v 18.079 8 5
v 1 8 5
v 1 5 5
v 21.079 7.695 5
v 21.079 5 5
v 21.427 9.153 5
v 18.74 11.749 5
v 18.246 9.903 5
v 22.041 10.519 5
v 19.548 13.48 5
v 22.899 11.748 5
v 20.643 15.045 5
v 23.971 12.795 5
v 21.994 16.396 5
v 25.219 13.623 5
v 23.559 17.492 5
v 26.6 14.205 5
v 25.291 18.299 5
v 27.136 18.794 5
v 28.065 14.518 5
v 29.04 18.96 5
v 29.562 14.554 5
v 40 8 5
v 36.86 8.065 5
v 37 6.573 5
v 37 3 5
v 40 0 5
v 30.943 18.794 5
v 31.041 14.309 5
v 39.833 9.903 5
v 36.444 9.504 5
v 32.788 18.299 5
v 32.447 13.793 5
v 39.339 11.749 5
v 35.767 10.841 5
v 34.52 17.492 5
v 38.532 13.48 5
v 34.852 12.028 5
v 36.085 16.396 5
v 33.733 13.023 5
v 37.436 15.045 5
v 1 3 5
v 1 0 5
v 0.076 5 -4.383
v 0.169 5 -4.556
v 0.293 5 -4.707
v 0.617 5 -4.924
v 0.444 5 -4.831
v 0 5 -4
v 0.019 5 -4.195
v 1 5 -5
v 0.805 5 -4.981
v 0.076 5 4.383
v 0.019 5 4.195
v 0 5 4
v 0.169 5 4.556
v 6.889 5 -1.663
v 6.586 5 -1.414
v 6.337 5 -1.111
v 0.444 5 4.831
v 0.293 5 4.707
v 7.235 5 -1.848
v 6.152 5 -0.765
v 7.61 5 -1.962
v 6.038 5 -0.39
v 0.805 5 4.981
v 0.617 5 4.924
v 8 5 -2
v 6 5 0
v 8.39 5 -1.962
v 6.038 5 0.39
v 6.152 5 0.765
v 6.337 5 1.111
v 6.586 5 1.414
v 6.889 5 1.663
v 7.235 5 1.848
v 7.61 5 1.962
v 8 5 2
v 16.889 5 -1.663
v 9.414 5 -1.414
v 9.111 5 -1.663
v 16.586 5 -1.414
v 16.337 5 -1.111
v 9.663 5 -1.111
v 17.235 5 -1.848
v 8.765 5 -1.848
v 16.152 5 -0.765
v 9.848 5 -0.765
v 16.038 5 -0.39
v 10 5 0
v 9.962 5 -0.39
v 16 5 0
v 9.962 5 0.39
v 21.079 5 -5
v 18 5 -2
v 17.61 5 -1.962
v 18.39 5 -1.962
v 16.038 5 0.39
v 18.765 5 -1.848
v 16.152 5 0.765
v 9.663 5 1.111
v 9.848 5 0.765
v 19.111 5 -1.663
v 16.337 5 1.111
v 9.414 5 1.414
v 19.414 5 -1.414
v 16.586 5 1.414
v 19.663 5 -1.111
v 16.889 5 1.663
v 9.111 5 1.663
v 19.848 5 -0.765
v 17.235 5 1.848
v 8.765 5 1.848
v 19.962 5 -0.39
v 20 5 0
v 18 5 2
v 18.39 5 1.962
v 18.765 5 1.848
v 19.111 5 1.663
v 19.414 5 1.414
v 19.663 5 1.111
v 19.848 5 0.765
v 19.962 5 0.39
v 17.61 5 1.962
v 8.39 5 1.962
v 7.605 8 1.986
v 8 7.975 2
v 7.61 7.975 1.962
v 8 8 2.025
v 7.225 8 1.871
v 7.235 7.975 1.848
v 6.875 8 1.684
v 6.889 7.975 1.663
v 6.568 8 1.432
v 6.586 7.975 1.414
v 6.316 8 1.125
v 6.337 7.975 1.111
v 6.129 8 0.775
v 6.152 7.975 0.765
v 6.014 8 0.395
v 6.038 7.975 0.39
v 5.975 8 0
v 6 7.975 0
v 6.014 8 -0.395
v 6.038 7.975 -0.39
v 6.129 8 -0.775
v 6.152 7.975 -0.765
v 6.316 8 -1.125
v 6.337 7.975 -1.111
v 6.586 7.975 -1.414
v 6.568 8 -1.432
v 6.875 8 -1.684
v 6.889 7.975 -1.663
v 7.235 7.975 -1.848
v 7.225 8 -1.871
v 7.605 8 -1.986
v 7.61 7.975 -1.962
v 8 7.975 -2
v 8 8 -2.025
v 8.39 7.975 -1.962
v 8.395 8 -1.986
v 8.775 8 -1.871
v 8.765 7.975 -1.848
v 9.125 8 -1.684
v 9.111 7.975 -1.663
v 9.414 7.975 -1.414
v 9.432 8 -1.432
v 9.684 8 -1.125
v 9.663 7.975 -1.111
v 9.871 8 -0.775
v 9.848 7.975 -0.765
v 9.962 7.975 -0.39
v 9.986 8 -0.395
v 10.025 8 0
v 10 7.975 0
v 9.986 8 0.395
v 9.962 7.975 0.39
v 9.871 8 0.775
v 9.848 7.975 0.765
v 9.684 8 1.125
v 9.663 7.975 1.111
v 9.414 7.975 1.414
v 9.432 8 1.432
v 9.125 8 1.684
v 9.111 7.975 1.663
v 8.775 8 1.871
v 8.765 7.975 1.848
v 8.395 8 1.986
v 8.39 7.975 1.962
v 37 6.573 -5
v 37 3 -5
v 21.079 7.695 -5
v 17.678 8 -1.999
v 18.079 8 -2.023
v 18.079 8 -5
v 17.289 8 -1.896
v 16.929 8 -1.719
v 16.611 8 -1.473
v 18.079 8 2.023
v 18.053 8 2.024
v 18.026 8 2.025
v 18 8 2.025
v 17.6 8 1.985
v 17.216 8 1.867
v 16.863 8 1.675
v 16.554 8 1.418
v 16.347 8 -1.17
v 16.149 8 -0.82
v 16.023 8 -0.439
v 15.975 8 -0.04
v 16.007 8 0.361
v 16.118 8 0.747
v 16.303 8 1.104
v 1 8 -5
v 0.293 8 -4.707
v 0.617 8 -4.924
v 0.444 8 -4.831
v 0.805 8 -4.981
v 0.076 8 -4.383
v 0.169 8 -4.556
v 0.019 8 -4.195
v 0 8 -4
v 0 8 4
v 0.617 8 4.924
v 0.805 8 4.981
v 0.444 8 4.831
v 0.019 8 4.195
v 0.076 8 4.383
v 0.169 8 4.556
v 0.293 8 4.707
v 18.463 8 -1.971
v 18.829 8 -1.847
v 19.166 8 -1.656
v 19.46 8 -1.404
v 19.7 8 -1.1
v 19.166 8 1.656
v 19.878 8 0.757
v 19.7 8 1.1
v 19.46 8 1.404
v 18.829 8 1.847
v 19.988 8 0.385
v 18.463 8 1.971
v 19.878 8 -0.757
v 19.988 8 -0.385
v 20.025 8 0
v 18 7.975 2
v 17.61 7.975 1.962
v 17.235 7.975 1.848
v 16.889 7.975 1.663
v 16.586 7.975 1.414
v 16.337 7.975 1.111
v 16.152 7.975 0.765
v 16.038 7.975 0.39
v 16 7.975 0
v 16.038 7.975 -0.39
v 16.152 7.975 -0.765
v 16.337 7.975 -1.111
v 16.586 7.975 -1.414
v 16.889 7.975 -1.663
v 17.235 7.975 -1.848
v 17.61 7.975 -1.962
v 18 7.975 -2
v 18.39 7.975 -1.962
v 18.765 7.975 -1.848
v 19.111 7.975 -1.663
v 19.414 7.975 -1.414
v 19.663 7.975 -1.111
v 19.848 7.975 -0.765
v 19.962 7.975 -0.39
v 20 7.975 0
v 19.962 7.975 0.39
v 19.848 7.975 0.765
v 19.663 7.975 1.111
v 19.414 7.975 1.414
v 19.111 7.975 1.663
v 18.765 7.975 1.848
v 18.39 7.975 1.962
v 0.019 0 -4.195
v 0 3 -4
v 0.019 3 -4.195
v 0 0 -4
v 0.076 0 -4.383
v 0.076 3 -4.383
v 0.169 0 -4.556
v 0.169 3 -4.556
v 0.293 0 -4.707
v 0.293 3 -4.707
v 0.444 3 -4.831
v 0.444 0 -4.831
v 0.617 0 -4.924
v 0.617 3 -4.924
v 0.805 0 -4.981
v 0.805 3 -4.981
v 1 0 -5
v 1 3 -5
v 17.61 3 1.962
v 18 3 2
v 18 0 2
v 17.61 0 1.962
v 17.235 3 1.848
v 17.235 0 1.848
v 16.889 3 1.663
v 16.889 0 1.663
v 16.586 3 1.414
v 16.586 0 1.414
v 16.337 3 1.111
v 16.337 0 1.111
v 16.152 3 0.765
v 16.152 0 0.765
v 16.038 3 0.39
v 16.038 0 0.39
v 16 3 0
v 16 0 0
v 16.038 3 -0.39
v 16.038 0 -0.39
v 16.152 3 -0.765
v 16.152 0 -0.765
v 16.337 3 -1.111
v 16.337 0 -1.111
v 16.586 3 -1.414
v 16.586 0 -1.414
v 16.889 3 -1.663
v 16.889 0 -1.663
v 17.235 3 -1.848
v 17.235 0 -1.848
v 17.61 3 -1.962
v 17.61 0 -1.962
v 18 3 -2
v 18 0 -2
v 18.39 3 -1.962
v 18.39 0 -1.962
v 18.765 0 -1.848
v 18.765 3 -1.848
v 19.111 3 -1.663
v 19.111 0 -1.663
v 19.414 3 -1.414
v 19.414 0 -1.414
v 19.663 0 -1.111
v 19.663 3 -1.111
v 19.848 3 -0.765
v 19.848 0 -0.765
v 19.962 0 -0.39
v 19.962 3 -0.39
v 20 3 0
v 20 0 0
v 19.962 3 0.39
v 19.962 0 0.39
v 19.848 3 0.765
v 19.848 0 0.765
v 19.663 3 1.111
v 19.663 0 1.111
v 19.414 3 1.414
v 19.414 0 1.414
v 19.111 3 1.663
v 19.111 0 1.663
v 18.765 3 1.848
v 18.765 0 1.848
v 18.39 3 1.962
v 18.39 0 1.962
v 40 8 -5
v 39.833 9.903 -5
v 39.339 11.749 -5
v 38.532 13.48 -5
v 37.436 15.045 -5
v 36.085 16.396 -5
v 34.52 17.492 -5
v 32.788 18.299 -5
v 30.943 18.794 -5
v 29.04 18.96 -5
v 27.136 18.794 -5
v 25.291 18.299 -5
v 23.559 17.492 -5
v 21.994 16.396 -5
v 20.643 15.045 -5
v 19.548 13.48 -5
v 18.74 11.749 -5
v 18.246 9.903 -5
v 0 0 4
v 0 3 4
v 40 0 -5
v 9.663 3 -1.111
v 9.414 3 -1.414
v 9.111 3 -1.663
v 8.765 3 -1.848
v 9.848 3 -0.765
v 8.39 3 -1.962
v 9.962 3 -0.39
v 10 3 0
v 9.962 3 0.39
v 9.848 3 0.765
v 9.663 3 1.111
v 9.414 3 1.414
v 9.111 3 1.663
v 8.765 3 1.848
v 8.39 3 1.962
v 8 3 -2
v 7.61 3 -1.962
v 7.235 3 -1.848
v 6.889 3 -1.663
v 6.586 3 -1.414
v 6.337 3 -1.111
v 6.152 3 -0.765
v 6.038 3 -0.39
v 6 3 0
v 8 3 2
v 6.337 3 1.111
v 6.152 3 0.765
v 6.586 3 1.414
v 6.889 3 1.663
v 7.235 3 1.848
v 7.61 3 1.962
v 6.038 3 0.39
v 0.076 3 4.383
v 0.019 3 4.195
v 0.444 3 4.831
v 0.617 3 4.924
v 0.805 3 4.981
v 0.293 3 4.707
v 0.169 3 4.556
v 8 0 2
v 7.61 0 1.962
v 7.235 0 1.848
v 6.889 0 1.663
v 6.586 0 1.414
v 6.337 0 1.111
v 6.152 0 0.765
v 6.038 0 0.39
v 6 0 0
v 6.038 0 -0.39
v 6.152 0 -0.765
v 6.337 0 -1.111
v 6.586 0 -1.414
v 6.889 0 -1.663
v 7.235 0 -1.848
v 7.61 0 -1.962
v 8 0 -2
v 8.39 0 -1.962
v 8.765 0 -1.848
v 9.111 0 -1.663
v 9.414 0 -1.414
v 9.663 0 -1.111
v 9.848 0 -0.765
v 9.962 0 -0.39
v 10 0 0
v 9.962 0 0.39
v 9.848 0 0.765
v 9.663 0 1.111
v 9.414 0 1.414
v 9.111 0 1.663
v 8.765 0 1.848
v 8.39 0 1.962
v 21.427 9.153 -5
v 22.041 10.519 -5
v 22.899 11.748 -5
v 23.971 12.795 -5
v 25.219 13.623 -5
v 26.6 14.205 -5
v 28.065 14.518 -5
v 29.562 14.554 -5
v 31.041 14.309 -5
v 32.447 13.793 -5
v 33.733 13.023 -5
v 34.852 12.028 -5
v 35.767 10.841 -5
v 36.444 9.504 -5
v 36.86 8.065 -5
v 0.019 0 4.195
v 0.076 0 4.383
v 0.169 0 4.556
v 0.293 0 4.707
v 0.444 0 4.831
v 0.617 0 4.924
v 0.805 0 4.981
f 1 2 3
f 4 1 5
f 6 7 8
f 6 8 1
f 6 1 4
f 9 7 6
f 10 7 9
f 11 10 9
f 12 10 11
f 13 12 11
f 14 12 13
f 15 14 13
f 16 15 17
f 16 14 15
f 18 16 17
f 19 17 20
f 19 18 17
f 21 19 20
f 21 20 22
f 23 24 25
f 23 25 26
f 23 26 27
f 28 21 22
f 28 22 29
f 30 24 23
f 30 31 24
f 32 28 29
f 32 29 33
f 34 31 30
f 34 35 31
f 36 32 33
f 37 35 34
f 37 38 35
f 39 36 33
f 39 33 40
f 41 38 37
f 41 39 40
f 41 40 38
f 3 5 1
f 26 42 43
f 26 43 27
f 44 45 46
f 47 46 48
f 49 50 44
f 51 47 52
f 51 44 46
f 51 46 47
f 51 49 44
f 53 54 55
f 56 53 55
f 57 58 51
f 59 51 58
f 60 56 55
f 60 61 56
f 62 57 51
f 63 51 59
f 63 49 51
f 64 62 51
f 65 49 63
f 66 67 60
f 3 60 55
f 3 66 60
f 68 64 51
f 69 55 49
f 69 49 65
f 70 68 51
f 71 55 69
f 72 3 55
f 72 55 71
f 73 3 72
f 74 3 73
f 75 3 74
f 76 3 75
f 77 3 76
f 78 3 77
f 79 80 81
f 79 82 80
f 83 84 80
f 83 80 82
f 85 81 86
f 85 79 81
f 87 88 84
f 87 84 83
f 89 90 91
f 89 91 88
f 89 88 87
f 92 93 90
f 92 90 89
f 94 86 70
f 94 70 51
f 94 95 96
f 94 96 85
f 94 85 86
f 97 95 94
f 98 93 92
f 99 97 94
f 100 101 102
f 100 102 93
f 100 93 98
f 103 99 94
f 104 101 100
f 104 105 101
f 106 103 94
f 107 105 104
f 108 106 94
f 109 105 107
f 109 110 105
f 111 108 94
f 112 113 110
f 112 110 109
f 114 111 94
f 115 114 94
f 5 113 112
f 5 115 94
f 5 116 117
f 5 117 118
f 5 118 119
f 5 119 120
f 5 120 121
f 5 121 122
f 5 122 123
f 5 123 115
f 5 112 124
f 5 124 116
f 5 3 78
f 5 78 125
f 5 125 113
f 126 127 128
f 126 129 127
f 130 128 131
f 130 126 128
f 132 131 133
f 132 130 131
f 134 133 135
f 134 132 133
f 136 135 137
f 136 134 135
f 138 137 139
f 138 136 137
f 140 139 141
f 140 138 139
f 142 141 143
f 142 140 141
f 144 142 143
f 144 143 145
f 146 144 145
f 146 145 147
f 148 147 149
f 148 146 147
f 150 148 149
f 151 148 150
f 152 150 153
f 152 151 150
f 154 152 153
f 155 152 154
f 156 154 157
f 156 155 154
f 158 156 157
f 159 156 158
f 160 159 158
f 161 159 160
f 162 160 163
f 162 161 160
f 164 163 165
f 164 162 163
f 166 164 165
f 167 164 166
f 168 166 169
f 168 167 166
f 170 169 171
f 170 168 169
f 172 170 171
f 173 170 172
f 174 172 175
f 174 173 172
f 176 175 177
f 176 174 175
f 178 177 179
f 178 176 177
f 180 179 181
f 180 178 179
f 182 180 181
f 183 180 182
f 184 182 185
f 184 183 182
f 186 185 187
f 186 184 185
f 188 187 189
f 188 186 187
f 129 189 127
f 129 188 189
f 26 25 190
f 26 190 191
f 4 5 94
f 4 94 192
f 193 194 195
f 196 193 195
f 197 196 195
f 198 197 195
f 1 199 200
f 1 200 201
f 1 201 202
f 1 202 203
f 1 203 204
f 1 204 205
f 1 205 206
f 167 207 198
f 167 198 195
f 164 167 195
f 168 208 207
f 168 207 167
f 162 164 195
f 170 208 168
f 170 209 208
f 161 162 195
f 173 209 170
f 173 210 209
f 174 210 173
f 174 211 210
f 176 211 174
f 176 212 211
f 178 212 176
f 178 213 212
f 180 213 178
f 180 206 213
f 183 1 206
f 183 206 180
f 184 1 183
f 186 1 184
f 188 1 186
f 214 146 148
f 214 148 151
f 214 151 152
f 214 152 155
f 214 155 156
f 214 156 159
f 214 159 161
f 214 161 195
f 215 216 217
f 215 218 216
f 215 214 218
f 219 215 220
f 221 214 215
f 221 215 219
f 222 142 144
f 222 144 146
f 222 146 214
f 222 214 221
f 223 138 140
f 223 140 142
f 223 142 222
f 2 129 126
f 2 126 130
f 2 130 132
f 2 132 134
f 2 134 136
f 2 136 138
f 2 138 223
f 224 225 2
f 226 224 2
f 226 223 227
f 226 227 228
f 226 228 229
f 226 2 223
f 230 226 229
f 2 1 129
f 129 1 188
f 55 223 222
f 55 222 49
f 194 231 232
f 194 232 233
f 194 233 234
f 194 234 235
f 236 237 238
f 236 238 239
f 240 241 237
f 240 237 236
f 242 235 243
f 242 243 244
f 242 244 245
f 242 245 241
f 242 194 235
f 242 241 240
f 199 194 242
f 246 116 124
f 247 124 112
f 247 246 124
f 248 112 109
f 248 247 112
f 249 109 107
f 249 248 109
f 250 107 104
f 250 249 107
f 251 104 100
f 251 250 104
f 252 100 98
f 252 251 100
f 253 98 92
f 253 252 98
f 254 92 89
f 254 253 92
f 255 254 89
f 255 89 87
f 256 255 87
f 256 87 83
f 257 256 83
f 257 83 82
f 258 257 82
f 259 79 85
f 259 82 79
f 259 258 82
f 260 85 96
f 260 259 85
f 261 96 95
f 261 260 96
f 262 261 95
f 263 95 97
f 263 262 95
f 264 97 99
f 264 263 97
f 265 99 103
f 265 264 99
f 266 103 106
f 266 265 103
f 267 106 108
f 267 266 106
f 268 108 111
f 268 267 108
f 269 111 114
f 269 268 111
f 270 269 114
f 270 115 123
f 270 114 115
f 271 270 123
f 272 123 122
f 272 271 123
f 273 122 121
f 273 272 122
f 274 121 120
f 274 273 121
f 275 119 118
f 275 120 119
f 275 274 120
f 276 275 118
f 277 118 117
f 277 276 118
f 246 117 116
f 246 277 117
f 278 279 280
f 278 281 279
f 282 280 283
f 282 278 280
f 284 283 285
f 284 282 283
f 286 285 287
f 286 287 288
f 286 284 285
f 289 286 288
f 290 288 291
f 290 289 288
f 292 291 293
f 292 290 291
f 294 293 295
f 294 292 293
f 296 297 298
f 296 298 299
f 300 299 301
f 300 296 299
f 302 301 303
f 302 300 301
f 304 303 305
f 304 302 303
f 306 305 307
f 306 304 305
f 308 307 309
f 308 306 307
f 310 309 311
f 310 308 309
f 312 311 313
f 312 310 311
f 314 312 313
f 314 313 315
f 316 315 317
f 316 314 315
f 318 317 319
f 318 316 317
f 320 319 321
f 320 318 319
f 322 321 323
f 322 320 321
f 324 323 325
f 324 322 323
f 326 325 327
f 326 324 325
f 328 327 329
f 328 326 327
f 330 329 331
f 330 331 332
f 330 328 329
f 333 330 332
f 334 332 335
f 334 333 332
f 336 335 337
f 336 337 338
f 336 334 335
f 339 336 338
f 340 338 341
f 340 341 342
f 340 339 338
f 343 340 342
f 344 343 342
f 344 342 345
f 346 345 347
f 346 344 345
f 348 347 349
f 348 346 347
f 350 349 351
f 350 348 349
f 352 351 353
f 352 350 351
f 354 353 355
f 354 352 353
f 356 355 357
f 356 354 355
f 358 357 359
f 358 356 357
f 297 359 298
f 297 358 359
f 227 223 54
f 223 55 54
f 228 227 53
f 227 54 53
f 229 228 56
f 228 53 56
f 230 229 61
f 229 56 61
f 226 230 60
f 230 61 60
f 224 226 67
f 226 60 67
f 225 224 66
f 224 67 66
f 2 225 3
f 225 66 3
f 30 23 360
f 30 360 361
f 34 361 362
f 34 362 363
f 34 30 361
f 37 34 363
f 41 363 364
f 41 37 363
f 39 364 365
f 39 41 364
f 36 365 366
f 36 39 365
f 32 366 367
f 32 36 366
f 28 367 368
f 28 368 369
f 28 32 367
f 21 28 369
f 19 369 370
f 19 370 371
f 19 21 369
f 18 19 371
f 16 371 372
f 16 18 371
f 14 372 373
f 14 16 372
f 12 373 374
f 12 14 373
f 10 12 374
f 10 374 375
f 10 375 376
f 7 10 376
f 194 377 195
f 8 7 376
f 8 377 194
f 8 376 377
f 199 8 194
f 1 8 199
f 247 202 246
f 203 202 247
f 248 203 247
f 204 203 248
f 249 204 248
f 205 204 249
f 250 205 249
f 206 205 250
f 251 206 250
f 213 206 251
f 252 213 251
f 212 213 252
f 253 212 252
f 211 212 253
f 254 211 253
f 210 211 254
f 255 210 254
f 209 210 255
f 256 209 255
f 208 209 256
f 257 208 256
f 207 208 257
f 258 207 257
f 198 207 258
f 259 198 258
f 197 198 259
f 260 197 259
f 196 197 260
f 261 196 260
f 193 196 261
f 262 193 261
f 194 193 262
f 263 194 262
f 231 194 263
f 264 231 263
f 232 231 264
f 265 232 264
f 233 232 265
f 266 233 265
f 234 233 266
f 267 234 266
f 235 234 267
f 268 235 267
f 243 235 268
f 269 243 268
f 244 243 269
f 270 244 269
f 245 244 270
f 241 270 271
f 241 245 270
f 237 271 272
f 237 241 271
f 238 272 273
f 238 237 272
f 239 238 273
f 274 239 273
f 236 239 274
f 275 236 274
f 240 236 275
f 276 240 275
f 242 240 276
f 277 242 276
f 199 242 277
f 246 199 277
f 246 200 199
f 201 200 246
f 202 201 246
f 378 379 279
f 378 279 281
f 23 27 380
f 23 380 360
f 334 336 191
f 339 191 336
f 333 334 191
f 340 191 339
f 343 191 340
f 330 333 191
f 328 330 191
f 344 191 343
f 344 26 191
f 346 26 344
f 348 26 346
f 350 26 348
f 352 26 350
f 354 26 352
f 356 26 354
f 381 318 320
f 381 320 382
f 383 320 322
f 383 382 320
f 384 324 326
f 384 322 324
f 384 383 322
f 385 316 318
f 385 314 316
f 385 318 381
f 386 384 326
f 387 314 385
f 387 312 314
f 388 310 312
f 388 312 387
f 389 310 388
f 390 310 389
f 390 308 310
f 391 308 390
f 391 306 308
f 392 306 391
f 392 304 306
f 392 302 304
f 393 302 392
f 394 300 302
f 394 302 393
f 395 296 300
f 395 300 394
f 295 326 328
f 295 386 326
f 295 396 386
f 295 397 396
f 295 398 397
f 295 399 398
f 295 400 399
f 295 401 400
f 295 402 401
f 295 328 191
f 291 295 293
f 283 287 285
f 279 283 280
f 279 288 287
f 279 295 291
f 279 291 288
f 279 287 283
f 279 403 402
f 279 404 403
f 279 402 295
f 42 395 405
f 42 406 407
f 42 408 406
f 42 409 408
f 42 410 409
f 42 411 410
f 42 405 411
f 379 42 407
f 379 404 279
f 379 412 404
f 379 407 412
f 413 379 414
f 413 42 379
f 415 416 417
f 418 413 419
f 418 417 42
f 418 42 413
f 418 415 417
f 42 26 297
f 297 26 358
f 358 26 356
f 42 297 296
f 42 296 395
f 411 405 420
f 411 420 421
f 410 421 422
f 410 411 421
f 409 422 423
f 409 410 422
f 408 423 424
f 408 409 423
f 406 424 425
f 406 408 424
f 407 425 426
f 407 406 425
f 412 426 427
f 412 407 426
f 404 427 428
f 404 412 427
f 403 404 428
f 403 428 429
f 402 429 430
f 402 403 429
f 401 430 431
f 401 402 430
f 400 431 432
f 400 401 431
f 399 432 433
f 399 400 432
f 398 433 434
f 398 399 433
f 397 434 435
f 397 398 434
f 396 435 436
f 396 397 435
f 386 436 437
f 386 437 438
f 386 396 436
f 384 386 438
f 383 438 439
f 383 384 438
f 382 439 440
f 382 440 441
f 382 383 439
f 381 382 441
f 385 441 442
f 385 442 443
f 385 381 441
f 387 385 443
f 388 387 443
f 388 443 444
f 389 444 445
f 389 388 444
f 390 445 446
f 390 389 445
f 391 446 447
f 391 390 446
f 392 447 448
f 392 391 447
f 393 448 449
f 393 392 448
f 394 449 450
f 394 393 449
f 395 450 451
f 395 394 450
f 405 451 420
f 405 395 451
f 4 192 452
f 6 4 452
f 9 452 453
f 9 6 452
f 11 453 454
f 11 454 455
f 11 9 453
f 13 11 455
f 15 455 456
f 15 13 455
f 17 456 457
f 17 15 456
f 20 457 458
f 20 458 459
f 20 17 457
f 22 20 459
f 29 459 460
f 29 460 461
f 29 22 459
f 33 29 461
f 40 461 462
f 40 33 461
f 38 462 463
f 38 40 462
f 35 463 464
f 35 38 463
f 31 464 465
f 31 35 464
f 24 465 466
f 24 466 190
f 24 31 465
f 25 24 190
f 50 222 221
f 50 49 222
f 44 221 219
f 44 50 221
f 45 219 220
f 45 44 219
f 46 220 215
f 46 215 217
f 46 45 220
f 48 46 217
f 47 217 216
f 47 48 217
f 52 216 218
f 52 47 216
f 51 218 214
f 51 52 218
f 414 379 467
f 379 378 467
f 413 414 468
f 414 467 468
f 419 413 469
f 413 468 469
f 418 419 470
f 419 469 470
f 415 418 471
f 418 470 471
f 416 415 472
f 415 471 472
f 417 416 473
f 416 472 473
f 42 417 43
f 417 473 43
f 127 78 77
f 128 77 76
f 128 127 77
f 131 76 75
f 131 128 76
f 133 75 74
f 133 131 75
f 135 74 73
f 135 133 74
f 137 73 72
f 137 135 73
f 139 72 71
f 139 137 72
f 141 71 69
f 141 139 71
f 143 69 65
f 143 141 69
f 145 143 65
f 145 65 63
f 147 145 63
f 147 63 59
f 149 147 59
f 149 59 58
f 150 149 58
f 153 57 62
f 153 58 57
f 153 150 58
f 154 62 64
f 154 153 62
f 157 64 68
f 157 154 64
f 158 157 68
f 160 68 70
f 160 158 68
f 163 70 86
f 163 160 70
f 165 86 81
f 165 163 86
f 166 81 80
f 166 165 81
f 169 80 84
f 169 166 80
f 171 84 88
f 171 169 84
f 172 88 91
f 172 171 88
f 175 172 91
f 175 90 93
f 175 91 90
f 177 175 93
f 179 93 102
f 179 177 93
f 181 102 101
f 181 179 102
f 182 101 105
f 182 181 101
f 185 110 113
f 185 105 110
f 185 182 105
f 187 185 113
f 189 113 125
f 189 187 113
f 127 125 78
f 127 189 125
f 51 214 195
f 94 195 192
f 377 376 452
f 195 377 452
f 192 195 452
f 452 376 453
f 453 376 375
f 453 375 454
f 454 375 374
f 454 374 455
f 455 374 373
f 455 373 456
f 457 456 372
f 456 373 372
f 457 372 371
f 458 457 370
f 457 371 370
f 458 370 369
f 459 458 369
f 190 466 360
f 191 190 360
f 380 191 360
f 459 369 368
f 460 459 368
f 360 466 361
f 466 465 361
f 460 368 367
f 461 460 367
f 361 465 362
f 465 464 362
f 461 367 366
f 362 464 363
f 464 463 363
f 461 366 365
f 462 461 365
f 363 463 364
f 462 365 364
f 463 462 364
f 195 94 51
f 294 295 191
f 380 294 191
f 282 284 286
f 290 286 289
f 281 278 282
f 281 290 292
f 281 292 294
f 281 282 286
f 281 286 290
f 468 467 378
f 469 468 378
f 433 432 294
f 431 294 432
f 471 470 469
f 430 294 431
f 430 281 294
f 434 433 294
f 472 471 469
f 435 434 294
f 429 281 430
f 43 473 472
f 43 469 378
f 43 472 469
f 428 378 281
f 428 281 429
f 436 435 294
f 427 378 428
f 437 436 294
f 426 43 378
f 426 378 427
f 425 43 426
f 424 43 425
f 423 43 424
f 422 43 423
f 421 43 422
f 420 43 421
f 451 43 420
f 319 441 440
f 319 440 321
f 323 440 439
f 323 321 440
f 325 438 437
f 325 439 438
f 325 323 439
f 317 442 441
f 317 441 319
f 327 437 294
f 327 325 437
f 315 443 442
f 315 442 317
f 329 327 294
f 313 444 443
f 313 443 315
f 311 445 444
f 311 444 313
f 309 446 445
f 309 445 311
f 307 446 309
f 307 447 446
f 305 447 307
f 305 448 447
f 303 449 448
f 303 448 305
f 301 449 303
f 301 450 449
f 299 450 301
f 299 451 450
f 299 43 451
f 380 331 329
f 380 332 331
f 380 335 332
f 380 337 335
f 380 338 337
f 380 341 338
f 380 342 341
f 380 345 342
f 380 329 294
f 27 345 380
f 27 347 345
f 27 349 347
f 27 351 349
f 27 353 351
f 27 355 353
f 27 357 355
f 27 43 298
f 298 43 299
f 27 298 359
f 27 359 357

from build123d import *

# Parameters (mm, degrees)
BOSS_EXTRUDE1_DEPTH            = 5
BOSS_EXTRUDE1_DEPTH_BACK       = 5
FILLET1_R                      = 1
F_4_0MM_DOWEL_HOLE1_AT_2_COUNT = 2
F_4_0MM_DOWEL_HOLE1_AT_2_PITCH = 10


with BuildPart() as part:
    # Sketch1 → Boss-Extrude1 (new, two sides: drawn at the far end of the back side and taken through both)
    with BuildSketch(Plane.XY.offset(-BOSS_EXTRUDE1_DEPTH_BACK)):
        with BuildLine():
            Line((0, 0), (40, 0))
            Line((40, 0), (40, 8))
            ThreePointArc((40, 8), (29.039542787, 18.960457213), (18.079085573, 8))
            Line((18.079085573, 8), (0, 8))
            Line((0, 8), (0, 5))
            Line((0, 5), (21.079085573, 5))
            Line((21.079085573, 5), (21.079085573, 7.695472827))
            ThreePointArc((21.079085573, 7.695472827), (29.562443146, 14.553574165), (37, 6.57337005))
            Line((37, 6.57337005), (37, 3))
            Line((37, 3), (0, 3))
            Line((0, 3), (0, 0))
        make_face()
    extrude(amount=BOSS_EXTRUDE1_DEPTH + BOSS_EXTRUDE1_DEPTH_BACK)

    # Fillet1
    fillet1_edges = [part.edges().sort_by_distance(p)[0] for p in [
        (0, 1.5, 5),
        (0, 6.5, 5),
        (0, 1.5, -5),
        (0, 6.5, -5),
    ]]
    fillet(fillet1_edges, radius=FILLET1_R)

    # Sketch5 → Ø4.0mm Dowel Hole1 (revolve, cut)
    with BuildSketch(Plane(origin=(8, 8, 0), x_dir=(0, 0, 1), z_dir=(1, 0, 0))):
        Polygon((0, 0), (0, 8), (2, 8), (2, 0.025), (2.025, 0), align=None)
    f_4_0mm_dowel_hole1 = revolve(axis=Axis((8, 14.35, 0), (0, -1, 0)), mode=Mode.SUBTRACT)

    # Ø4.0mm Dowel Hole1 at 2: Ø4.0mm Dowel Hole1 ×2
    with Locations(*[(i * F_4_0MM_DOWEL_HOLE1_AT_2_PITCH, 0, 0) for i in range(1, F_4_0MM_DOWEL_HOLE1_AT_2_COUNT)]):
        add(f_4_0mm_dowel_hole1, mode=Mode.SUBTRACT)


solid = part.part
